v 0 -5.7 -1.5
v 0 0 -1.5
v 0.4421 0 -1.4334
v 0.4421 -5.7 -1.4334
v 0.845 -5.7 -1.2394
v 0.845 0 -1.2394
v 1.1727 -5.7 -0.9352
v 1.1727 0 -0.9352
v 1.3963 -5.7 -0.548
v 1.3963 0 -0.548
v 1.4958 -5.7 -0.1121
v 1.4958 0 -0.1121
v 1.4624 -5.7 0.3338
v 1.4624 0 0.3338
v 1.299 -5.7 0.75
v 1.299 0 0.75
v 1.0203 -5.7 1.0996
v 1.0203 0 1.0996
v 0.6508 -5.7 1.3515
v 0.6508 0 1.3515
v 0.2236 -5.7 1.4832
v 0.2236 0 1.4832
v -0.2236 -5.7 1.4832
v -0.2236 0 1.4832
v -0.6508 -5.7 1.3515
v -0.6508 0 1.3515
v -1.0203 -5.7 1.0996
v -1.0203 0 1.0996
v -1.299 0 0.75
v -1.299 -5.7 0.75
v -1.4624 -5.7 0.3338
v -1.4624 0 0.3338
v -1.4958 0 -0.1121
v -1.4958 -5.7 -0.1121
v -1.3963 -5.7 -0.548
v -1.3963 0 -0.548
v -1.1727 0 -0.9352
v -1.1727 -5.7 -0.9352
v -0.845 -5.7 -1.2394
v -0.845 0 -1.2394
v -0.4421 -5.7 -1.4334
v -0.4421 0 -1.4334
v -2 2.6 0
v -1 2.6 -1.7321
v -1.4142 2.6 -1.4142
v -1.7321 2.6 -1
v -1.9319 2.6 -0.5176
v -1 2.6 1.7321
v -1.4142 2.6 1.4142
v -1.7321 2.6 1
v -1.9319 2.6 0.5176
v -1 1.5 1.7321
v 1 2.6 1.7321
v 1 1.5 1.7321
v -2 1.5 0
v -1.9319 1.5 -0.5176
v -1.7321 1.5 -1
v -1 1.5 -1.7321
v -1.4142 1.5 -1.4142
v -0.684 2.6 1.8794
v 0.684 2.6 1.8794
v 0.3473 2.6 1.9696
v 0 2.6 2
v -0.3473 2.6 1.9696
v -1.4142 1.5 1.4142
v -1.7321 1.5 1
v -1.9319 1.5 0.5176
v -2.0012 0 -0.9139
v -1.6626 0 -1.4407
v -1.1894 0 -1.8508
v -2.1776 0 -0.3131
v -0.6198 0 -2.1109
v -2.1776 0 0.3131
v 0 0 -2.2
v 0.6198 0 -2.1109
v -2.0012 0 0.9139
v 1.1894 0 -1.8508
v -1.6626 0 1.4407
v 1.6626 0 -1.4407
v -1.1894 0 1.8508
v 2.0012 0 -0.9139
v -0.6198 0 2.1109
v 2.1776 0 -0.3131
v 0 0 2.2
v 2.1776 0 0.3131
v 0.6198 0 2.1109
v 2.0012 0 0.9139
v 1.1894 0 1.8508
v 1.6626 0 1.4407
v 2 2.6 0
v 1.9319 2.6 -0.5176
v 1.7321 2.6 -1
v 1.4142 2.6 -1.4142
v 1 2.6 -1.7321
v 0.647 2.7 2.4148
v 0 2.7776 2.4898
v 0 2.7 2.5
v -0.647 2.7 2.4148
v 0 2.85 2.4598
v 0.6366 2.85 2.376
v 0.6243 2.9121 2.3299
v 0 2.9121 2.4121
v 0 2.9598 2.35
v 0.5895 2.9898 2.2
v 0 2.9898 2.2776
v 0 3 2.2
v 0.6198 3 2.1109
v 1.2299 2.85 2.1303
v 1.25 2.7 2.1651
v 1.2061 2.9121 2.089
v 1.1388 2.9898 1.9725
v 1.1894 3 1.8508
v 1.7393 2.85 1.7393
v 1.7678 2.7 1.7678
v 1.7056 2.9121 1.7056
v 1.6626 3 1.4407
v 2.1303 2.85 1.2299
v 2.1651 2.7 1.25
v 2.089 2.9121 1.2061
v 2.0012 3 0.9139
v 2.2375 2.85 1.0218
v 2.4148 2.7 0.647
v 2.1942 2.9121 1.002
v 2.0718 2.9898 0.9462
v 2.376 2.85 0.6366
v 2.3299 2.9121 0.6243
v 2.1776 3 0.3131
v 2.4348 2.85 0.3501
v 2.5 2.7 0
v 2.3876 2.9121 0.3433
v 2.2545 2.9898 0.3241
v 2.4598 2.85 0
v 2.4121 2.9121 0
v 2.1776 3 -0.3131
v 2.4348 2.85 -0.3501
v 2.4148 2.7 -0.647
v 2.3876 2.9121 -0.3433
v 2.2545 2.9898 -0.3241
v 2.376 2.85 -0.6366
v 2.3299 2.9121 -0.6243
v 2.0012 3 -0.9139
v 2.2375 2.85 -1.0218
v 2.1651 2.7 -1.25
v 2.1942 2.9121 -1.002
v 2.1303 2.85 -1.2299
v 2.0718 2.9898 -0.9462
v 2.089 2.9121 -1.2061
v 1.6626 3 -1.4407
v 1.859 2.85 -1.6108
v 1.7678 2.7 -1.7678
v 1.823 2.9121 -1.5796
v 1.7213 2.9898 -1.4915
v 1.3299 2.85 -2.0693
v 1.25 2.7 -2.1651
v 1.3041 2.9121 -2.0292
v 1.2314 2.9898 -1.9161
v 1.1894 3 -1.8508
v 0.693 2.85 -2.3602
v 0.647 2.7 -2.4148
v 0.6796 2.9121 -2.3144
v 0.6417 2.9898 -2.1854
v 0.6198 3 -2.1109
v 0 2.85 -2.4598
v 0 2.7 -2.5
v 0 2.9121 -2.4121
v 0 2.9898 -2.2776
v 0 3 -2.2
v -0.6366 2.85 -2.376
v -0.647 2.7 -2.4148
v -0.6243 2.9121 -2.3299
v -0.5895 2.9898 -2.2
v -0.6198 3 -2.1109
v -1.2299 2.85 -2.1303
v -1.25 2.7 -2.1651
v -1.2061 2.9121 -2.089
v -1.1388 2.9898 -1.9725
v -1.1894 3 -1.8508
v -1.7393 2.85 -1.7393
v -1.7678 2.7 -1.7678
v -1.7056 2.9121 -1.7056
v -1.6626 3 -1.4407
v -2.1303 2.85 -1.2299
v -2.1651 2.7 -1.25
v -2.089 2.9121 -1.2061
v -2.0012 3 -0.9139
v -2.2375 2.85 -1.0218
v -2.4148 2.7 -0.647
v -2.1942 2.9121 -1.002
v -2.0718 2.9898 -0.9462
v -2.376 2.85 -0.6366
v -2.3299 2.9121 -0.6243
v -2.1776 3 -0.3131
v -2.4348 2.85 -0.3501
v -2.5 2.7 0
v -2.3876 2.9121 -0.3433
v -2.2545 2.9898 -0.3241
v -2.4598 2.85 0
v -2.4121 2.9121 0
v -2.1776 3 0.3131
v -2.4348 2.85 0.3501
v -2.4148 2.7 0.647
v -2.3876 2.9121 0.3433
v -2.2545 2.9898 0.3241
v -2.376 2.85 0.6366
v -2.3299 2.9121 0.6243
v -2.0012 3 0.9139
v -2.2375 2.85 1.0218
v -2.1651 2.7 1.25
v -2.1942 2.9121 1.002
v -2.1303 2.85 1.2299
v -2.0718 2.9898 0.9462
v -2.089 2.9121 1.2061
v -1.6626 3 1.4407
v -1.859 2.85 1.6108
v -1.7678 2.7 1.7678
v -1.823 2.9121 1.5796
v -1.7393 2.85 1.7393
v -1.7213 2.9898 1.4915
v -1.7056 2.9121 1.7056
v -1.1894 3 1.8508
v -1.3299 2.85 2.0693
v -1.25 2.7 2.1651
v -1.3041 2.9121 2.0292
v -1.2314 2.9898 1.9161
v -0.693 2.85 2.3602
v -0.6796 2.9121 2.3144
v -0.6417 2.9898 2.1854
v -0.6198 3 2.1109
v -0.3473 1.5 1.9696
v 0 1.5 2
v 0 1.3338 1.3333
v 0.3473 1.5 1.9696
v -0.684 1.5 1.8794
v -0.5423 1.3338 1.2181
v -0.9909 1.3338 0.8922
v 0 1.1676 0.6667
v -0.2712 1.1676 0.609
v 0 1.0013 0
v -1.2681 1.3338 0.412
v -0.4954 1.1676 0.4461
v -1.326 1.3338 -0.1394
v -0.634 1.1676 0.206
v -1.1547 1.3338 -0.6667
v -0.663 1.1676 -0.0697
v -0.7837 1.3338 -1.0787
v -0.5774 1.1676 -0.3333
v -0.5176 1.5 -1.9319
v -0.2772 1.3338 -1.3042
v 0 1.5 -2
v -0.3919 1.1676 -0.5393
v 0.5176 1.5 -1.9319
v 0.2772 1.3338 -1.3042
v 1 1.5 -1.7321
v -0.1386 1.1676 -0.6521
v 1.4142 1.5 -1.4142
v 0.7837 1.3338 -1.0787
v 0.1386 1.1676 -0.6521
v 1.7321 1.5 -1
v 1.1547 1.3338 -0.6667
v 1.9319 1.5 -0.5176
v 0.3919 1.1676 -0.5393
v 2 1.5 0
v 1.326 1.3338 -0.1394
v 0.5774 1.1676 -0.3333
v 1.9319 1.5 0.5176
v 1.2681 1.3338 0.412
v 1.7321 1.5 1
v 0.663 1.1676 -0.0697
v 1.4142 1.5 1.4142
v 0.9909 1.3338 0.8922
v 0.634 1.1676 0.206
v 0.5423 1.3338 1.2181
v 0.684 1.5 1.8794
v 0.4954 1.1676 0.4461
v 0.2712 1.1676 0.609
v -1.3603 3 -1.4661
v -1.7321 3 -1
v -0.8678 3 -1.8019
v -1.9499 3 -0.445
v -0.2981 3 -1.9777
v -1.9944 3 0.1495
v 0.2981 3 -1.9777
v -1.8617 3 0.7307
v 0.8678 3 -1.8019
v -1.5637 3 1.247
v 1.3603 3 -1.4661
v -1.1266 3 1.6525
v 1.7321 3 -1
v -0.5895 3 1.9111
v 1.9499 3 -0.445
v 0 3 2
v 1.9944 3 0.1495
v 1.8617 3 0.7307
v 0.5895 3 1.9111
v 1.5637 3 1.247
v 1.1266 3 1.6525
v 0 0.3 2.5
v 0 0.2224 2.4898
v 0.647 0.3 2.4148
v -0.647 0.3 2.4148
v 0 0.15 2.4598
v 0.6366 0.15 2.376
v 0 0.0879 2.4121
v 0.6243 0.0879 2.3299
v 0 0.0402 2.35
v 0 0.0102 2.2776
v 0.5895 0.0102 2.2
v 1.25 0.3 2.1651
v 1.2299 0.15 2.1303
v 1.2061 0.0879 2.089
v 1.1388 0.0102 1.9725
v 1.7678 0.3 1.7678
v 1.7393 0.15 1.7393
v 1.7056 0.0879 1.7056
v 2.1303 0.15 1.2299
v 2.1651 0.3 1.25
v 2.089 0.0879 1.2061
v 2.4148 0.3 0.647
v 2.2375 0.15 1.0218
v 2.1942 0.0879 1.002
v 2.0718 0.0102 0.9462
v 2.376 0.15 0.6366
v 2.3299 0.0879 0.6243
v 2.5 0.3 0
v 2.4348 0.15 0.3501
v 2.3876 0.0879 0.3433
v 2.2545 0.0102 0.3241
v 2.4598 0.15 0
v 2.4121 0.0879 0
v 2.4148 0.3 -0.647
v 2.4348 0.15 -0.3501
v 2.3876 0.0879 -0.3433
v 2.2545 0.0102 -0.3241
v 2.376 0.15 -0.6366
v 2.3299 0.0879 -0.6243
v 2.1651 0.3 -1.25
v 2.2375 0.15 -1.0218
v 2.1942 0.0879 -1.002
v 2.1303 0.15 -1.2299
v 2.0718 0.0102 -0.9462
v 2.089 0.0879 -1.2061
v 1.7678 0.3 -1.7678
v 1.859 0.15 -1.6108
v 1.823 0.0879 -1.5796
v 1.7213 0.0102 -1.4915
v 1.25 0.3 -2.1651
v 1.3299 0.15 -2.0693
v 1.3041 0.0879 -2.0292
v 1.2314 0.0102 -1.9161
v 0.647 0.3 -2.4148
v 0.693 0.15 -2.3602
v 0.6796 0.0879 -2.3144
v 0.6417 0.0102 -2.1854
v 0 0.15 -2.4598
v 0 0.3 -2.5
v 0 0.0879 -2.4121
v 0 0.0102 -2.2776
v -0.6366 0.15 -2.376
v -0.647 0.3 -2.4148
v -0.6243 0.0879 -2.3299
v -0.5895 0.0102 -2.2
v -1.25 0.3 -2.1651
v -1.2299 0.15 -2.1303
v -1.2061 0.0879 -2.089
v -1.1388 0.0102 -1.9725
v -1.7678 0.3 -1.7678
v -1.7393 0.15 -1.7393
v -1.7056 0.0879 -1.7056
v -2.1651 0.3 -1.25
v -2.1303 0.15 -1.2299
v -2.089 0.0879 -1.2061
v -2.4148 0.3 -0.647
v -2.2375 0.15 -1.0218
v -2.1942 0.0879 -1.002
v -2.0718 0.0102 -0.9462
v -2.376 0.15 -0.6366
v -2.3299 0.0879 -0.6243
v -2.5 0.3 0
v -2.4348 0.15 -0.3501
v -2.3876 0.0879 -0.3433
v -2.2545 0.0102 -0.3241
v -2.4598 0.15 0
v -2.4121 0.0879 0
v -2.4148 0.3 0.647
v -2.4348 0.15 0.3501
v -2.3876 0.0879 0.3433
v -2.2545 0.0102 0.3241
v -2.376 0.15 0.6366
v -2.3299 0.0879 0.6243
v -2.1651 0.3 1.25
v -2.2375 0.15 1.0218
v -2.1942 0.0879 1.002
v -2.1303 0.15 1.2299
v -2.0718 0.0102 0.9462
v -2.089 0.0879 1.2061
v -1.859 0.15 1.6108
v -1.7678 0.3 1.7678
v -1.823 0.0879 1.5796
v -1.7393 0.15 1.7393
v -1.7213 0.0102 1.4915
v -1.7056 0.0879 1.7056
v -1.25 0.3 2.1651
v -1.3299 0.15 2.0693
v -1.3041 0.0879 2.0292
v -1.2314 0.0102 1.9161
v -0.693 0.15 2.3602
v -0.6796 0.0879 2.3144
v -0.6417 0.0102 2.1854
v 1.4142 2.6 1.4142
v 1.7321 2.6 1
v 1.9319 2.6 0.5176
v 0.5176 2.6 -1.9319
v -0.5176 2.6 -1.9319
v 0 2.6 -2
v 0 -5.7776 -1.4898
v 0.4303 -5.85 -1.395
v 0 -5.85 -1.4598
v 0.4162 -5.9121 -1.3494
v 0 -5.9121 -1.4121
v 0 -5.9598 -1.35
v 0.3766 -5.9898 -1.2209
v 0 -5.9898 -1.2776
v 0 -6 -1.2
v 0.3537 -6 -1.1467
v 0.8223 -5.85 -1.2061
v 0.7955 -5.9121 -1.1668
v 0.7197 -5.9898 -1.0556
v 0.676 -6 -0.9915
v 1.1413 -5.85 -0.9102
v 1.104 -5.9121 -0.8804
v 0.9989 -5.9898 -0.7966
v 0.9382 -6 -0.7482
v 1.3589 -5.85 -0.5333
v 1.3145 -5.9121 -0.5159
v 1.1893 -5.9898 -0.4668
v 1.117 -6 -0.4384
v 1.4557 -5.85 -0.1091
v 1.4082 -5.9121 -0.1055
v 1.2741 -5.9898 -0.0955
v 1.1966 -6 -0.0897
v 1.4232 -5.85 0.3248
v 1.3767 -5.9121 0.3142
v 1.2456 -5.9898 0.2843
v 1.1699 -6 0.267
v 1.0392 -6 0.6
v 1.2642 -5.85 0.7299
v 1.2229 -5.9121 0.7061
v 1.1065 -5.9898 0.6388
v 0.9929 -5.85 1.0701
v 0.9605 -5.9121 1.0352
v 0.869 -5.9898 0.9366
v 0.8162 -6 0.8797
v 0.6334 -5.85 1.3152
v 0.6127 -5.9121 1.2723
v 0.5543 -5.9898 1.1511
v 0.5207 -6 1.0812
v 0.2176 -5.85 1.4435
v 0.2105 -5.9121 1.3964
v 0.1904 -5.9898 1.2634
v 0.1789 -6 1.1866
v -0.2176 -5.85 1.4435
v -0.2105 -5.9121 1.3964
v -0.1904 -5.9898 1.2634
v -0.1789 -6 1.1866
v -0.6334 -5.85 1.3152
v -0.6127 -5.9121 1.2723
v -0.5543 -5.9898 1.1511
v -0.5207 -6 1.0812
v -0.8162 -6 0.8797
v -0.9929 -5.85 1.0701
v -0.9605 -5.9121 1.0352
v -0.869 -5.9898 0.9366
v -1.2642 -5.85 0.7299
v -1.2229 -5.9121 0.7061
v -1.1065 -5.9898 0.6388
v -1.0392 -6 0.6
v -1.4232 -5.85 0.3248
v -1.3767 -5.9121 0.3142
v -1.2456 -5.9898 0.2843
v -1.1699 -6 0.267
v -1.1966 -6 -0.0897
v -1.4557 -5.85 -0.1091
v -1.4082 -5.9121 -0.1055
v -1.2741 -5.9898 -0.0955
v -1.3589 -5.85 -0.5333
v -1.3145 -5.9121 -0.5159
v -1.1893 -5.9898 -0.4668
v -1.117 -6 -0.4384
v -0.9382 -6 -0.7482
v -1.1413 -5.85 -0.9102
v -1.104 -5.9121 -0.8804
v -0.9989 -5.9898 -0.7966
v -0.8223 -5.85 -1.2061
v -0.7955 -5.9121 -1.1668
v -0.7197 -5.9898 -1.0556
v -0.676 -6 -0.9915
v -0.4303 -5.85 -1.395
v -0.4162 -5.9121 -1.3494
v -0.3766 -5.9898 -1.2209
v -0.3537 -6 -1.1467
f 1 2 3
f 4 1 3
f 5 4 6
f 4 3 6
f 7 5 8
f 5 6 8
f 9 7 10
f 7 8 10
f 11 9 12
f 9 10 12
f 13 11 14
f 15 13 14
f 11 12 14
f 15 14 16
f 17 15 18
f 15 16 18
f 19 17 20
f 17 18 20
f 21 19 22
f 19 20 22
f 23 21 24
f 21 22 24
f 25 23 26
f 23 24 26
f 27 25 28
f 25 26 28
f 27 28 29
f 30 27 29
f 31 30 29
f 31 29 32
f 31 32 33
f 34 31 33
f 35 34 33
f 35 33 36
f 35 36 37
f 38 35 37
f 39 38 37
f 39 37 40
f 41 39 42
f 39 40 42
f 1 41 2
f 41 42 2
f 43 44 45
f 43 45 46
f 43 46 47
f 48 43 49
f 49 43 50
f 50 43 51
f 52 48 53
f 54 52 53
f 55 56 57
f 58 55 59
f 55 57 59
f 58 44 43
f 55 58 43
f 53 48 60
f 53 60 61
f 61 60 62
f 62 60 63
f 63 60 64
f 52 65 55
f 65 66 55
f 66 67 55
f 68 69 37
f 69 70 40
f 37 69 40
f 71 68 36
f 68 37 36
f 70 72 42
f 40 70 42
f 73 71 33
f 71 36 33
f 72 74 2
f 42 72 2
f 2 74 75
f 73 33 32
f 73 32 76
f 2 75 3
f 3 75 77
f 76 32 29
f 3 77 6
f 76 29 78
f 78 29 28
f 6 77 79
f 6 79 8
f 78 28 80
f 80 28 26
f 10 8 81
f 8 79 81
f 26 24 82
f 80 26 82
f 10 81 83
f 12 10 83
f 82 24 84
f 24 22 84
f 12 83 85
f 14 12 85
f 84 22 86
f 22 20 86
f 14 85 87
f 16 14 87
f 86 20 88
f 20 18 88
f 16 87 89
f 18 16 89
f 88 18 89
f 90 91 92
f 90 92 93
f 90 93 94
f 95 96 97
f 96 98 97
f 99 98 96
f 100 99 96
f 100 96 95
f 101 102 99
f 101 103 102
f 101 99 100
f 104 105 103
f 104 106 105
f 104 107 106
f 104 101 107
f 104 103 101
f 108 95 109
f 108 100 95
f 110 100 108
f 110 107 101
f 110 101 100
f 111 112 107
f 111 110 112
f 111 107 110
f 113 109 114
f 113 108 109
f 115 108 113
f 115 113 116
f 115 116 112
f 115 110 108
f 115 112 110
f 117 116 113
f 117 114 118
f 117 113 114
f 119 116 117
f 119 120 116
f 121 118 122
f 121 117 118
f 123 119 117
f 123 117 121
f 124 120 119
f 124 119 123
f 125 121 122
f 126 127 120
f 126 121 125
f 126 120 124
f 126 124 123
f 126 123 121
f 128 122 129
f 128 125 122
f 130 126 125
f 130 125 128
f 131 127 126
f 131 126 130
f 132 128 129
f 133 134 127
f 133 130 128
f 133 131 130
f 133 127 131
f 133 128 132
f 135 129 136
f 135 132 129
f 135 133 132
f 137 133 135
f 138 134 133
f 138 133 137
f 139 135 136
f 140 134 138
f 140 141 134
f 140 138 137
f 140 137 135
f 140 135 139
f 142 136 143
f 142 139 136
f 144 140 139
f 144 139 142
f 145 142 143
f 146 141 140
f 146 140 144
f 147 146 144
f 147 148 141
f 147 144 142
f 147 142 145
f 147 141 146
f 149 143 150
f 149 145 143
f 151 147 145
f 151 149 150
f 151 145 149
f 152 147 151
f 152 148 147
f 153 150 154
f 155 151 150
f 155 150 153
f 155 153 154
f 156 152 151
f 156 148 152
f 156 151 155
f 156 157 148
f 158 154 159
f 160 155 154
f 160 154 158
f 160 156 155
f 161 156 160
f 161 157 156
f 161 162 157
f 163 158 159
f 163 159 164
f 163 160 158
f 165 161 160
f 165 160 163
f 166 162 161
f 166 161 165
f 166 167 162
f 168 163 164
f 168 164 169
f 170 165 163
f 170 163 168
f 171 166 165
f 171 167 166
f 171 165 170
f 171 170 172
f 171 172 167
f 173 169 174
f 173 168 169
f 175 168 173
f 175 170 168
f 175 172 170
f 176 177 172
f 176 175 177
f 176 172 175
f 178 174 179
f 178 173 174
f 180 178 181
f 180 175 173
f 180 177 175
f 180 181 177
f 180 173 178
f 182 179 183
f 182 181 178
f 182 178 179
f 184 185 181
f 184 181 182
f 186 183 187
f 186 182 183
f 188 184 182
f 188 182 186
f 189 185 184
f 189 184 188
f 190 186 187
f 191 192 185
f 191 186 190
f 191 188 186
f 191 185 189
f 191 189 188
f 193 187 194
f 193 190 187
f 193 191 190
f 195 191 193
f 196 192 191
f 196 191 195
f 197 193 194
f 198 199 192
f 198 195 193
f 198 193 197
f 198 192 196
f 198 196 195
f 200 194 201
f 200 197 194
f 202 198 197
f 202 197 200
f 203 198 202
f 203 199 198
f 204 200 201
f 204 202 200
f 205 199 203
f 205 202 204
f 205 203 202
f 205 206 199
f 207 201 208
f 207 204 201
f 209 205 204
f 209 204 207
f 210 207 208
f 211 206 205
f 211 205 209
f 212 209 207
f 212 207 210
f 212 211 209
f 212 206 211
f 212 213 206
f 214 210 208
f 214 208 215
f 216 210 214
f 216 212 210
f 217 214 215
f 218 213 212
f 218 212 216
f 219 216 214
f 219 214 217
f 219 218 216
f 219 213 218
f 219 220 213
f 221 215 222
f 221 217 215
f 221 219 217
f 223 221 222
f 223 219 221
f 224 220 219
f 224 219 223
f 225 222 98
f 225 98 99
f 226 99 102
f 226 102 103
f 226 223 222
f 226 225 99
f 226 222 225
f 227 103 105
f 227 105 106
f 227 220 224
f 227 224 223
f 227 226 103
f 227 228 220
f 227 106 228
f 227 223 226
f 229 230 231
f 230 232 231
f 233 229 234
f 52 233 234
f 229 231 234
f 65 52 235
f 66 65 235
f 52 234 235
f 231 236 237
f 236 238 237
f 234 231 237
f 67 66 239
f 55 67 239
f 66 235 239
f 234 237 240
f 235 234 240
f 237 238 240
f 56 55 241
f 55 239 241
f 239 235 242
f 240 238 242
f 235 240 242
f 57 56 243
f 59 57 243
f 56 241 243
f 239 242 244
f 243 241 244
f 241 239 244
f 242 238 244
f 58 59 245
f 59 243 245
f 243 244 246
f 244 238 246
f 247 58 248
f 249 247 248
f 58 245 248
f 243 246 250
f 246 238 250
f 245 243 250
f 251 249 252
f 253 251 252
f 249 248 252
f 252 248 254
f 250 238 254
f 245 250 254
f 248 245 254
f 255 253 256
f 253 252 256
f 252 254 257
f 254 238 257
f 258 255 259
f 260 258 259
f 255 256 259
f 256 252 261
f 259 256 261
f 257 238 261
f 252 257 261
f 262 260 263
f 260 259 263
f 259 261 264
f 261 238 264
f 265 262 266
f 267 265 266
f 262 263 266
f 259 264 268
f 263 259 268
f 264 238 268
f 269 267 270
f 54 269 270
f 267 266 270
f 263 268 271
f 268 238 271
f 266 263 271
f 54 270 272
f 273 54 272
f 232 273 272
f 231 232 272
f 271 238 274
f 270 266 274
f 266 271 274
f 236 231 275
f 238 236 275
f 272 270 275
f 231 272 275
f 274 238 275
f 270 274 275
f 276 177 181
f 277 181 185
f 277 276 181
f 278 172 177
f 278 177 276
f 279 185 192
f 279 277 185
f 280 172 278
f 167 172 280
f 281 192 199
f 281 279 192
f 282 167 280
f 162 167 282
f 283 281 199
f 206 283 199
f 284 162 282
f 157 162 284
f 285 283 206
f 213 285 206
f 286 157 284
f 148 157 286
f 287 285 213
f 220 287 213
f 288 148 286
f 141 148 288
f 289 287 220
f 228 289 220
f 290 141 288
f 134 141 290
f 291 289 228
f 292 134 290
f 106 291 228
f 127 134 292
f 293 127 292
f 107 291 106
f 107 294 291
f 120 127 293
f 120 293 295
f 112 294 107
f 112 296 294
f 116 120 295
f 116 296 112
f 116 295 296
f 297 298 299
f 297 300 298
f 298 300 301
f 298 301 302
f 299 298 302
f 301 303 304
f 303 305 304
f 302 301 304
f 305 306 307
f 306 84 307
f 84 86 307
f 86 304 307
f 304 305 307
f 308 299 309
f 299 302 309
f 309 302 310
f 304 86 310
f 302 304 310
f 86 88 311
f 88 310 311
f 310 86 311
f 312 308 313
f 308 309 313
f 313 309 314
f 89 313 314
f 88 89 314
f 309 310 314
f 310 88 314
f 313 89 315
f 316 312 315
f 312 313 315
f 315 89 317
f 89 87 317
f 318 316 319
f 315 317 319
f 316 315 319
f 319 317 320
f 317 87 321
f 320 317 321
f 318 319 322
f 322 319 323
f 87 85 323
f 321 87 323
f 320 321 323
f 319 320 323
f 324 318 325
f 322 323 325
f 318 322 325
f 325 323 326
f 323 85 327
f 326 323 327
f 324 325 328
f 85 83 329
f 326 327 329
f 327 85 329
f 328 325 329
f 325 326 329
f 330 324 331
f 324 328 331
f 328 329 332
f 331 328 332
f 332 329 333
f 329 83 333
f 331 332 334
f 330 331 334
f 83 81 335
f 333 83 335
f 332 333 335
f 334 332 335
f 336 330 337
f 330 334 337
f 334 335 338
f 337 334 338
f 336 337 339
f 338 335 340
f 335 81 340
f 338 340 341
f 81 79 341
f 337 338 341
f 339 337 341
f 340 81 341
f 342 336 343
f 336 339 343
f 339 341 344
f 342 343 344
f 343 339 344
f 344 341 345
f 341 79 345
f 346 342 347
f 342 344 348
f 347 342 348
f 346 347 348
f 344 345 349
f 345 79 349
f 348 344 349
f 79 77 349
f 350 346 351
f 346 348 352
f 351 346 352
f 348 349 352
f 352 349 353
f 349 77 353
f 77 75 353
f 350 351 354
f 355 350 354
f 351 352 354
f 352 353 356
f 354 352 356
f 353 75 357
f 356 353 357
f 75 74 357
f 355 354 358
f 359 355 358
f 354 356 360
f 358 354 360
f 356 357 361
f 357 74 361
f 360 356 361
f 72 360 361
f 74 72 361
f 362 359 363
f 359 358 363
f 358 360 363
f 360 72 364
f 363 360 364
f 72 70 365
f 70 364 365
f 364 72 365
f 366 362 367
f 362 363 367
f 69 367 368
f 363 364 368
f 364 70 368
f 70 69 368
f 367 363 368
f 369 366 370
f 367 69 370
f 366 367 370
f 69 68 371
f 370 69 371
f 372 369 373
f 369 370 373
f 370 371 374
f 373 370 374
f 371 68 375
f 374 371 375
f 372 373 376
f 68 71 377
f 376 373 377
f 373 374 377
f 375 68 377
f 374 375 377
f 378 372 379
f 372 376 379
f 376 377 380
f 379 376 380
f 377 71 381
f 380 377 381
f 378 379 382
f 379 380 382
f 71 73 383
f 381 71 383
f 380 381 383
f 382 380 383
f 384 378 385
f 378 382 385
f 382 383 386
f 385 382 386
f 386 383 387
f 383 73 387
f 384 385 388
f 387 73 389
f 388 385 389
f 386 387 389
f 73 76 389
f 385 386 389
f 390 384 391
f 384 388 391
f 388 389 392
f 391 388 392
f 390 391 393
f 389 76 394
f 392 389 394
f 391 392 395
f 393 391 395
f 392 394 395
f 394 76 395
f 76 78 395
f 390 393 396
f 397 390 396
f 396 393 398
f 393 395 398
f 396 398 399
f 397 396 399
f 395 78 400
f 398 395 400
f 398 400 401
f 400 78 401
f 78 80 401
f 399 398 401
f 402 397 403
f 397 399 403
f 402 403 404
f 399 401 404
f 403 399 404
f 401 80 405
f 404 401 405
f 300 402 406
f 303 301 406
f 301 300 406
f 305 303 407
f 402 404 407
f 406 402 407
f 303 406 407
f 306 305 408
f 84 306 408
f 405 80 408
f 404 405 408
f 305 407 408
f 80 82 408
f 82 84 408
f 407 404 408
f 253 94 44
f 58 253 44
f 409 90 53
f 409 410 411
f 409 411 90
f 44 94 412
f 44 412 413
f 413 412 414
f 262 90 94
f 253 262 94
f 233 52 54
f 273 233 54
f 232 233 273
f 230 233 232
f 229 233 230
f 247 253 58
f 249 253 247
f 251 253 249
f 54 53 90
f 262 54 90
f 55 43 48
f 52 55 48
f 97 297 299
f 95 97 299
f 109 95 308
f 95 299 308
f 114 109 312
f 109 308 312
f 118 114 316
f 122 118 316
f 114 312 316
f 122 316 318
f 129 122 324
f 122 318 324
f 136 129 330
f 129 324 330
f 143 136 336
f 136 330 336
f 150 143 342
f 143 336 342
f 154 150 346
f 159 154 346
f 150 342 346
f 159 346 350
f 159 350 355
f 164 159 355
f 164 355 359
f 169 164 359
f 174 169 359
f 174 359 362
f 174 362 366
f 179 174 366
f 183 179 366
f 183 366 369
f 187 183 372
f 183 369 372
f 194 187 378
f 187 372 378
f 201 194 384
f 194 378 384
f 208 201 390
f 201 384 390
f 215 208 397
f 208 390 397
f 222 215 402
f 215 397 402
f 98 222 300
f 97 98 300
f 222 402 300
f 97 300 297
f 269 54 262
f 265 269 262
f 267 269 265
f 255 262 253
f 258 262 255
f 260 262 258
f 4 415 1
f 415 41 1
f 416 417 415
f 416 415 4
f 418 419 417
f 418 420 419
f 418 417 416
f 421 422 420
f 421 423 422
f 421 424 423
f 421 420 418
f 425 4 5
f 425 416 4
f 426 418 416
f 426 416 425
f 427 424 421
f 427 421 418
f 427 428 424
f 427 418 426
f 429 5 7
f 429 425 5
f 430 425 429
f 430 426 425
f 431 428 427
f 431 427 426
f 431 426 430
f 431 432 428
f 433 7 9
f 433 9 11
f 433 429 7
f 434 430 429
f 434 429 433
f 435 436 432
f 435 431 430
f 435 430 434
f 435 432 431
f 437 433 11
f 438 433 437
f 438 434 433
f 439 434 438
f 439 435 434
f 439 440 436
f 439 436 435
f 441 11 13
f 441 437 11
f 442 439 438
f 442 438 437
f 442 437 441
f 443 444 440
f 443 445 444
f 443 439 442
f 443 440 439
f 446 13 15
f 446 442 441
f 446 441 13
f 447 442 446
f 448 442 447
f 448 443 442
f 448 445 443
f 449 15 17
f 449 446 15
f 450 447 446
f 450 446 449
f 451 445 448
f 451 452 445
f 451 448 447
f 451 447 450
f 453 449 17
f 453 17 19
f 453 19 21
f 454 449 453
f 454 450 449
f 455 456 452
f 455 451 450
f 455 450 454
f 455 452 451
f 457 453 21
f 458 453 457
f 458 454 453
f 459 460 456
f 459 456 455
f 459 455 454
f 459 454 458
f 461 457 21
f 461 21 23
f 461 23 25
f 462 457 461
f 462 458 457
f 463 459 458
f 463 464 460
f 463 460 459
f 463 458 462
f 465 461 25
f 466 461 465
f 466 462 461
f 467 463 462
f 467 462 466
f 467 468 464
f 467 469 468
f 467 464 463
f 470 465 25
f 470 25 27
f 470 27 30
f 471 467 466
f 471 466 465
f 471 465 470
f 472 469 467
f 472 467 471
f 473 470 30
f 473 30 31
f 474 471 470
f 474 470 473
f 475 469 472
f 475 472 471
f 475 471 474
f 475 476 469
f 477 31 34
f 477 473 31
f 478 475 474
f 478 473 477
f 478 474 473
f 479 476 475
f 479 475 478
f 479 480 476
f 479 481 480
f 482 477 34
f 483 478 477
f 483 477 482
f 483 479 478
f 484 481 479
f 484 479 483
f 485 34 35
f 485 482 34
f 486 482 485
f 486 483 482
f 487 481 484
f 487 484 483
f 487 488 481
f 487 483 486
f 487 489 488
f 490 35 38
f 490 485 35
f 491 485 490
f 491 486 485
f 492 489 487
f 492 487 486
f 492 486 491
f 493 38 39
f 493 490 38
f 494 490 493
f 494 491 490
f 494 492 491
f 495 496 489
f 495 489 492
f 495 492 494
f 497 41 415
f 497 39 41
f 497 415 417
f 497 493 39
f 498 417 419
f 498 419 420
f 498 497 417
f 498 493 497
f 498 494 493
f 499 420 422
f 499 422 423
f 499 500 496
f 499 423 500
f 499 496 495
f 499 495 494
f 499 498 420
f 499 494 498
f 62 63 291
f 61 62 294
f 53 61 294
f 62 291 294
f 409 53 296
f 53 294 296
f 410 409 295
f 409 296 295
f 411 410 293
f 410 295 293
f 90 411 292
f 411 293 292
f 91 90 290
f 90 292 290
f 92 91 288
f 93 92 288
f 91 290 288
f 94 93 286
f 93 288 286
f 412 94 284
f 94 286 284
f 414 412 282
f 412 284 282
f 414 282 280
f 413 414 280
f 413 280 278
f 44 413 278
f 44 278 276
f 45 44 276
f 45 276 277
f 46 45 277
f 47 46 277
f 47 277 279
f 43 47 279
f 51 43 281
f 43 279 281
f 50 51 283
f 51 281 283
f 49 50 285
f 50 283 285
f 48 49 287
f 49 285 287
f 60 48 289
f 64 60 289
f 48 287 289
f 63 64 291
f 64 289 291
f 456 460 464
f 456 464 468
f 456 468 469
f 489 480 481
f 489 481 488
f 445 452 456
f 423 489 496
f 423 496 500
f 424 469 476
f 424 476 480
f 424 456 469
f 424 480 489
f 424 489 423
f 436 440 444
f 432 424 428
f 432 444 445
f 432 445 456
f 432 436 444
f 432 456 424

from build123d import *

# Parameters (mm, degrees)
SKETCH1_R           = 2.5
BOSS_EXTRUDE1_DEPTH = 3
CUT_EXTRUDE1_DEPTH  = 1.5
CUT_EXTRUDE2_START  = 1.5
SKETCH5_R           = 2
CUT_EXTRUDE2_DEPTH  = 0.4
SKETCH7_R           = 1.5
BOSS_EXTRUDE2_DEPTH = 6
FILLET1_R           = 0.3
FILLET2_R           = 0.3


with BuildPart() as part:
    # Sketch1 → Boss-Extrude1 (new body)
    with BuildSketch(Plane(origin=(0, 0, 0), x_dir=(1, 0, 0), z_dir=(0, 1, 0))):
        with Locations(Location((0, 0, 0), (0, 0, 270))):
            Circle(SKETCH1_R)
    extrude(amount=BOSS_EXTRUDE1_DEPTH)

    # Sketch2 → Cut-Extrude1 (cut)
    with BuildSketch(Plane(origin=(0, 3, 0), x_dir=(1, 0, 0), z_dir=(0, 1, 0))):
        Polygon((2, 0), (1, 1.732050808), (-1, 1.732050808), (-2, 0), (-1, -1.732050808), (1, -1.732050808), align=None)
    extrude(amount=-CUT_EXTRUDE1_DEPTH, mode=Mode.SUBTRACT)

    # Sketch5 → Cut-Extrude2 (cut)
    with BuildSketch(Plane(origin=(0, 1.5, 0), x_dir=(1, 0, 0), z_dir=(0, 1, 0)).offset(CUT_EXTRUDE2_START)):
        with Locations(Location((0, 0, 0), (0, 0, 270))):
            Circle(SKETCH5_R)
    extrude(amount=-CUT_EXTRUDE2_DEPTH, mode=Mode.SUBTRACT)

    # Cut-Extrude3 cone 1 section (through the dimple's axis) → Cut-Extrude3 (revolve, cut)
    with BuildSketch(Plane(origin=(0, 1.5, 0), x_dir=(0, 0, 1), z_dir=(1, 0, 0))):
        Polygon((0, 0), (2, 0), (0, 0.498656006), align=None)
    revolve(axis=Axis((0, 1.5, 0), (0, -1, 0)), mode=Mode.SUBTRACT)

    # Sketch7 → Boss-Extrude2 (add)
    with BuildSketch(Plane.XZ):
        with Locations(Location((0, 0, 0), (0, 0, 270))):
            Circle(SKETCH7_R)
    extrude(amount=BOSS_EXTRUDE2_DEPTH)

    # Fillet1
    fillet1_edges = [part.edges().sort_by_distance(p)[0] for p in [
        (0, 0, -2.5),
        (0, 3, -2.5),
    ]]
    fillet(fillet1_edges, radius=FILLET1_R)

    # Fillet2
    fillet2_edges = [part.edges().sort_by_distance(p)[0] for p in [
        (0, -6, 1.5),
    ]]
    fillet(fillet2_edges, radius=FILLET2_R)


solid = part.part
